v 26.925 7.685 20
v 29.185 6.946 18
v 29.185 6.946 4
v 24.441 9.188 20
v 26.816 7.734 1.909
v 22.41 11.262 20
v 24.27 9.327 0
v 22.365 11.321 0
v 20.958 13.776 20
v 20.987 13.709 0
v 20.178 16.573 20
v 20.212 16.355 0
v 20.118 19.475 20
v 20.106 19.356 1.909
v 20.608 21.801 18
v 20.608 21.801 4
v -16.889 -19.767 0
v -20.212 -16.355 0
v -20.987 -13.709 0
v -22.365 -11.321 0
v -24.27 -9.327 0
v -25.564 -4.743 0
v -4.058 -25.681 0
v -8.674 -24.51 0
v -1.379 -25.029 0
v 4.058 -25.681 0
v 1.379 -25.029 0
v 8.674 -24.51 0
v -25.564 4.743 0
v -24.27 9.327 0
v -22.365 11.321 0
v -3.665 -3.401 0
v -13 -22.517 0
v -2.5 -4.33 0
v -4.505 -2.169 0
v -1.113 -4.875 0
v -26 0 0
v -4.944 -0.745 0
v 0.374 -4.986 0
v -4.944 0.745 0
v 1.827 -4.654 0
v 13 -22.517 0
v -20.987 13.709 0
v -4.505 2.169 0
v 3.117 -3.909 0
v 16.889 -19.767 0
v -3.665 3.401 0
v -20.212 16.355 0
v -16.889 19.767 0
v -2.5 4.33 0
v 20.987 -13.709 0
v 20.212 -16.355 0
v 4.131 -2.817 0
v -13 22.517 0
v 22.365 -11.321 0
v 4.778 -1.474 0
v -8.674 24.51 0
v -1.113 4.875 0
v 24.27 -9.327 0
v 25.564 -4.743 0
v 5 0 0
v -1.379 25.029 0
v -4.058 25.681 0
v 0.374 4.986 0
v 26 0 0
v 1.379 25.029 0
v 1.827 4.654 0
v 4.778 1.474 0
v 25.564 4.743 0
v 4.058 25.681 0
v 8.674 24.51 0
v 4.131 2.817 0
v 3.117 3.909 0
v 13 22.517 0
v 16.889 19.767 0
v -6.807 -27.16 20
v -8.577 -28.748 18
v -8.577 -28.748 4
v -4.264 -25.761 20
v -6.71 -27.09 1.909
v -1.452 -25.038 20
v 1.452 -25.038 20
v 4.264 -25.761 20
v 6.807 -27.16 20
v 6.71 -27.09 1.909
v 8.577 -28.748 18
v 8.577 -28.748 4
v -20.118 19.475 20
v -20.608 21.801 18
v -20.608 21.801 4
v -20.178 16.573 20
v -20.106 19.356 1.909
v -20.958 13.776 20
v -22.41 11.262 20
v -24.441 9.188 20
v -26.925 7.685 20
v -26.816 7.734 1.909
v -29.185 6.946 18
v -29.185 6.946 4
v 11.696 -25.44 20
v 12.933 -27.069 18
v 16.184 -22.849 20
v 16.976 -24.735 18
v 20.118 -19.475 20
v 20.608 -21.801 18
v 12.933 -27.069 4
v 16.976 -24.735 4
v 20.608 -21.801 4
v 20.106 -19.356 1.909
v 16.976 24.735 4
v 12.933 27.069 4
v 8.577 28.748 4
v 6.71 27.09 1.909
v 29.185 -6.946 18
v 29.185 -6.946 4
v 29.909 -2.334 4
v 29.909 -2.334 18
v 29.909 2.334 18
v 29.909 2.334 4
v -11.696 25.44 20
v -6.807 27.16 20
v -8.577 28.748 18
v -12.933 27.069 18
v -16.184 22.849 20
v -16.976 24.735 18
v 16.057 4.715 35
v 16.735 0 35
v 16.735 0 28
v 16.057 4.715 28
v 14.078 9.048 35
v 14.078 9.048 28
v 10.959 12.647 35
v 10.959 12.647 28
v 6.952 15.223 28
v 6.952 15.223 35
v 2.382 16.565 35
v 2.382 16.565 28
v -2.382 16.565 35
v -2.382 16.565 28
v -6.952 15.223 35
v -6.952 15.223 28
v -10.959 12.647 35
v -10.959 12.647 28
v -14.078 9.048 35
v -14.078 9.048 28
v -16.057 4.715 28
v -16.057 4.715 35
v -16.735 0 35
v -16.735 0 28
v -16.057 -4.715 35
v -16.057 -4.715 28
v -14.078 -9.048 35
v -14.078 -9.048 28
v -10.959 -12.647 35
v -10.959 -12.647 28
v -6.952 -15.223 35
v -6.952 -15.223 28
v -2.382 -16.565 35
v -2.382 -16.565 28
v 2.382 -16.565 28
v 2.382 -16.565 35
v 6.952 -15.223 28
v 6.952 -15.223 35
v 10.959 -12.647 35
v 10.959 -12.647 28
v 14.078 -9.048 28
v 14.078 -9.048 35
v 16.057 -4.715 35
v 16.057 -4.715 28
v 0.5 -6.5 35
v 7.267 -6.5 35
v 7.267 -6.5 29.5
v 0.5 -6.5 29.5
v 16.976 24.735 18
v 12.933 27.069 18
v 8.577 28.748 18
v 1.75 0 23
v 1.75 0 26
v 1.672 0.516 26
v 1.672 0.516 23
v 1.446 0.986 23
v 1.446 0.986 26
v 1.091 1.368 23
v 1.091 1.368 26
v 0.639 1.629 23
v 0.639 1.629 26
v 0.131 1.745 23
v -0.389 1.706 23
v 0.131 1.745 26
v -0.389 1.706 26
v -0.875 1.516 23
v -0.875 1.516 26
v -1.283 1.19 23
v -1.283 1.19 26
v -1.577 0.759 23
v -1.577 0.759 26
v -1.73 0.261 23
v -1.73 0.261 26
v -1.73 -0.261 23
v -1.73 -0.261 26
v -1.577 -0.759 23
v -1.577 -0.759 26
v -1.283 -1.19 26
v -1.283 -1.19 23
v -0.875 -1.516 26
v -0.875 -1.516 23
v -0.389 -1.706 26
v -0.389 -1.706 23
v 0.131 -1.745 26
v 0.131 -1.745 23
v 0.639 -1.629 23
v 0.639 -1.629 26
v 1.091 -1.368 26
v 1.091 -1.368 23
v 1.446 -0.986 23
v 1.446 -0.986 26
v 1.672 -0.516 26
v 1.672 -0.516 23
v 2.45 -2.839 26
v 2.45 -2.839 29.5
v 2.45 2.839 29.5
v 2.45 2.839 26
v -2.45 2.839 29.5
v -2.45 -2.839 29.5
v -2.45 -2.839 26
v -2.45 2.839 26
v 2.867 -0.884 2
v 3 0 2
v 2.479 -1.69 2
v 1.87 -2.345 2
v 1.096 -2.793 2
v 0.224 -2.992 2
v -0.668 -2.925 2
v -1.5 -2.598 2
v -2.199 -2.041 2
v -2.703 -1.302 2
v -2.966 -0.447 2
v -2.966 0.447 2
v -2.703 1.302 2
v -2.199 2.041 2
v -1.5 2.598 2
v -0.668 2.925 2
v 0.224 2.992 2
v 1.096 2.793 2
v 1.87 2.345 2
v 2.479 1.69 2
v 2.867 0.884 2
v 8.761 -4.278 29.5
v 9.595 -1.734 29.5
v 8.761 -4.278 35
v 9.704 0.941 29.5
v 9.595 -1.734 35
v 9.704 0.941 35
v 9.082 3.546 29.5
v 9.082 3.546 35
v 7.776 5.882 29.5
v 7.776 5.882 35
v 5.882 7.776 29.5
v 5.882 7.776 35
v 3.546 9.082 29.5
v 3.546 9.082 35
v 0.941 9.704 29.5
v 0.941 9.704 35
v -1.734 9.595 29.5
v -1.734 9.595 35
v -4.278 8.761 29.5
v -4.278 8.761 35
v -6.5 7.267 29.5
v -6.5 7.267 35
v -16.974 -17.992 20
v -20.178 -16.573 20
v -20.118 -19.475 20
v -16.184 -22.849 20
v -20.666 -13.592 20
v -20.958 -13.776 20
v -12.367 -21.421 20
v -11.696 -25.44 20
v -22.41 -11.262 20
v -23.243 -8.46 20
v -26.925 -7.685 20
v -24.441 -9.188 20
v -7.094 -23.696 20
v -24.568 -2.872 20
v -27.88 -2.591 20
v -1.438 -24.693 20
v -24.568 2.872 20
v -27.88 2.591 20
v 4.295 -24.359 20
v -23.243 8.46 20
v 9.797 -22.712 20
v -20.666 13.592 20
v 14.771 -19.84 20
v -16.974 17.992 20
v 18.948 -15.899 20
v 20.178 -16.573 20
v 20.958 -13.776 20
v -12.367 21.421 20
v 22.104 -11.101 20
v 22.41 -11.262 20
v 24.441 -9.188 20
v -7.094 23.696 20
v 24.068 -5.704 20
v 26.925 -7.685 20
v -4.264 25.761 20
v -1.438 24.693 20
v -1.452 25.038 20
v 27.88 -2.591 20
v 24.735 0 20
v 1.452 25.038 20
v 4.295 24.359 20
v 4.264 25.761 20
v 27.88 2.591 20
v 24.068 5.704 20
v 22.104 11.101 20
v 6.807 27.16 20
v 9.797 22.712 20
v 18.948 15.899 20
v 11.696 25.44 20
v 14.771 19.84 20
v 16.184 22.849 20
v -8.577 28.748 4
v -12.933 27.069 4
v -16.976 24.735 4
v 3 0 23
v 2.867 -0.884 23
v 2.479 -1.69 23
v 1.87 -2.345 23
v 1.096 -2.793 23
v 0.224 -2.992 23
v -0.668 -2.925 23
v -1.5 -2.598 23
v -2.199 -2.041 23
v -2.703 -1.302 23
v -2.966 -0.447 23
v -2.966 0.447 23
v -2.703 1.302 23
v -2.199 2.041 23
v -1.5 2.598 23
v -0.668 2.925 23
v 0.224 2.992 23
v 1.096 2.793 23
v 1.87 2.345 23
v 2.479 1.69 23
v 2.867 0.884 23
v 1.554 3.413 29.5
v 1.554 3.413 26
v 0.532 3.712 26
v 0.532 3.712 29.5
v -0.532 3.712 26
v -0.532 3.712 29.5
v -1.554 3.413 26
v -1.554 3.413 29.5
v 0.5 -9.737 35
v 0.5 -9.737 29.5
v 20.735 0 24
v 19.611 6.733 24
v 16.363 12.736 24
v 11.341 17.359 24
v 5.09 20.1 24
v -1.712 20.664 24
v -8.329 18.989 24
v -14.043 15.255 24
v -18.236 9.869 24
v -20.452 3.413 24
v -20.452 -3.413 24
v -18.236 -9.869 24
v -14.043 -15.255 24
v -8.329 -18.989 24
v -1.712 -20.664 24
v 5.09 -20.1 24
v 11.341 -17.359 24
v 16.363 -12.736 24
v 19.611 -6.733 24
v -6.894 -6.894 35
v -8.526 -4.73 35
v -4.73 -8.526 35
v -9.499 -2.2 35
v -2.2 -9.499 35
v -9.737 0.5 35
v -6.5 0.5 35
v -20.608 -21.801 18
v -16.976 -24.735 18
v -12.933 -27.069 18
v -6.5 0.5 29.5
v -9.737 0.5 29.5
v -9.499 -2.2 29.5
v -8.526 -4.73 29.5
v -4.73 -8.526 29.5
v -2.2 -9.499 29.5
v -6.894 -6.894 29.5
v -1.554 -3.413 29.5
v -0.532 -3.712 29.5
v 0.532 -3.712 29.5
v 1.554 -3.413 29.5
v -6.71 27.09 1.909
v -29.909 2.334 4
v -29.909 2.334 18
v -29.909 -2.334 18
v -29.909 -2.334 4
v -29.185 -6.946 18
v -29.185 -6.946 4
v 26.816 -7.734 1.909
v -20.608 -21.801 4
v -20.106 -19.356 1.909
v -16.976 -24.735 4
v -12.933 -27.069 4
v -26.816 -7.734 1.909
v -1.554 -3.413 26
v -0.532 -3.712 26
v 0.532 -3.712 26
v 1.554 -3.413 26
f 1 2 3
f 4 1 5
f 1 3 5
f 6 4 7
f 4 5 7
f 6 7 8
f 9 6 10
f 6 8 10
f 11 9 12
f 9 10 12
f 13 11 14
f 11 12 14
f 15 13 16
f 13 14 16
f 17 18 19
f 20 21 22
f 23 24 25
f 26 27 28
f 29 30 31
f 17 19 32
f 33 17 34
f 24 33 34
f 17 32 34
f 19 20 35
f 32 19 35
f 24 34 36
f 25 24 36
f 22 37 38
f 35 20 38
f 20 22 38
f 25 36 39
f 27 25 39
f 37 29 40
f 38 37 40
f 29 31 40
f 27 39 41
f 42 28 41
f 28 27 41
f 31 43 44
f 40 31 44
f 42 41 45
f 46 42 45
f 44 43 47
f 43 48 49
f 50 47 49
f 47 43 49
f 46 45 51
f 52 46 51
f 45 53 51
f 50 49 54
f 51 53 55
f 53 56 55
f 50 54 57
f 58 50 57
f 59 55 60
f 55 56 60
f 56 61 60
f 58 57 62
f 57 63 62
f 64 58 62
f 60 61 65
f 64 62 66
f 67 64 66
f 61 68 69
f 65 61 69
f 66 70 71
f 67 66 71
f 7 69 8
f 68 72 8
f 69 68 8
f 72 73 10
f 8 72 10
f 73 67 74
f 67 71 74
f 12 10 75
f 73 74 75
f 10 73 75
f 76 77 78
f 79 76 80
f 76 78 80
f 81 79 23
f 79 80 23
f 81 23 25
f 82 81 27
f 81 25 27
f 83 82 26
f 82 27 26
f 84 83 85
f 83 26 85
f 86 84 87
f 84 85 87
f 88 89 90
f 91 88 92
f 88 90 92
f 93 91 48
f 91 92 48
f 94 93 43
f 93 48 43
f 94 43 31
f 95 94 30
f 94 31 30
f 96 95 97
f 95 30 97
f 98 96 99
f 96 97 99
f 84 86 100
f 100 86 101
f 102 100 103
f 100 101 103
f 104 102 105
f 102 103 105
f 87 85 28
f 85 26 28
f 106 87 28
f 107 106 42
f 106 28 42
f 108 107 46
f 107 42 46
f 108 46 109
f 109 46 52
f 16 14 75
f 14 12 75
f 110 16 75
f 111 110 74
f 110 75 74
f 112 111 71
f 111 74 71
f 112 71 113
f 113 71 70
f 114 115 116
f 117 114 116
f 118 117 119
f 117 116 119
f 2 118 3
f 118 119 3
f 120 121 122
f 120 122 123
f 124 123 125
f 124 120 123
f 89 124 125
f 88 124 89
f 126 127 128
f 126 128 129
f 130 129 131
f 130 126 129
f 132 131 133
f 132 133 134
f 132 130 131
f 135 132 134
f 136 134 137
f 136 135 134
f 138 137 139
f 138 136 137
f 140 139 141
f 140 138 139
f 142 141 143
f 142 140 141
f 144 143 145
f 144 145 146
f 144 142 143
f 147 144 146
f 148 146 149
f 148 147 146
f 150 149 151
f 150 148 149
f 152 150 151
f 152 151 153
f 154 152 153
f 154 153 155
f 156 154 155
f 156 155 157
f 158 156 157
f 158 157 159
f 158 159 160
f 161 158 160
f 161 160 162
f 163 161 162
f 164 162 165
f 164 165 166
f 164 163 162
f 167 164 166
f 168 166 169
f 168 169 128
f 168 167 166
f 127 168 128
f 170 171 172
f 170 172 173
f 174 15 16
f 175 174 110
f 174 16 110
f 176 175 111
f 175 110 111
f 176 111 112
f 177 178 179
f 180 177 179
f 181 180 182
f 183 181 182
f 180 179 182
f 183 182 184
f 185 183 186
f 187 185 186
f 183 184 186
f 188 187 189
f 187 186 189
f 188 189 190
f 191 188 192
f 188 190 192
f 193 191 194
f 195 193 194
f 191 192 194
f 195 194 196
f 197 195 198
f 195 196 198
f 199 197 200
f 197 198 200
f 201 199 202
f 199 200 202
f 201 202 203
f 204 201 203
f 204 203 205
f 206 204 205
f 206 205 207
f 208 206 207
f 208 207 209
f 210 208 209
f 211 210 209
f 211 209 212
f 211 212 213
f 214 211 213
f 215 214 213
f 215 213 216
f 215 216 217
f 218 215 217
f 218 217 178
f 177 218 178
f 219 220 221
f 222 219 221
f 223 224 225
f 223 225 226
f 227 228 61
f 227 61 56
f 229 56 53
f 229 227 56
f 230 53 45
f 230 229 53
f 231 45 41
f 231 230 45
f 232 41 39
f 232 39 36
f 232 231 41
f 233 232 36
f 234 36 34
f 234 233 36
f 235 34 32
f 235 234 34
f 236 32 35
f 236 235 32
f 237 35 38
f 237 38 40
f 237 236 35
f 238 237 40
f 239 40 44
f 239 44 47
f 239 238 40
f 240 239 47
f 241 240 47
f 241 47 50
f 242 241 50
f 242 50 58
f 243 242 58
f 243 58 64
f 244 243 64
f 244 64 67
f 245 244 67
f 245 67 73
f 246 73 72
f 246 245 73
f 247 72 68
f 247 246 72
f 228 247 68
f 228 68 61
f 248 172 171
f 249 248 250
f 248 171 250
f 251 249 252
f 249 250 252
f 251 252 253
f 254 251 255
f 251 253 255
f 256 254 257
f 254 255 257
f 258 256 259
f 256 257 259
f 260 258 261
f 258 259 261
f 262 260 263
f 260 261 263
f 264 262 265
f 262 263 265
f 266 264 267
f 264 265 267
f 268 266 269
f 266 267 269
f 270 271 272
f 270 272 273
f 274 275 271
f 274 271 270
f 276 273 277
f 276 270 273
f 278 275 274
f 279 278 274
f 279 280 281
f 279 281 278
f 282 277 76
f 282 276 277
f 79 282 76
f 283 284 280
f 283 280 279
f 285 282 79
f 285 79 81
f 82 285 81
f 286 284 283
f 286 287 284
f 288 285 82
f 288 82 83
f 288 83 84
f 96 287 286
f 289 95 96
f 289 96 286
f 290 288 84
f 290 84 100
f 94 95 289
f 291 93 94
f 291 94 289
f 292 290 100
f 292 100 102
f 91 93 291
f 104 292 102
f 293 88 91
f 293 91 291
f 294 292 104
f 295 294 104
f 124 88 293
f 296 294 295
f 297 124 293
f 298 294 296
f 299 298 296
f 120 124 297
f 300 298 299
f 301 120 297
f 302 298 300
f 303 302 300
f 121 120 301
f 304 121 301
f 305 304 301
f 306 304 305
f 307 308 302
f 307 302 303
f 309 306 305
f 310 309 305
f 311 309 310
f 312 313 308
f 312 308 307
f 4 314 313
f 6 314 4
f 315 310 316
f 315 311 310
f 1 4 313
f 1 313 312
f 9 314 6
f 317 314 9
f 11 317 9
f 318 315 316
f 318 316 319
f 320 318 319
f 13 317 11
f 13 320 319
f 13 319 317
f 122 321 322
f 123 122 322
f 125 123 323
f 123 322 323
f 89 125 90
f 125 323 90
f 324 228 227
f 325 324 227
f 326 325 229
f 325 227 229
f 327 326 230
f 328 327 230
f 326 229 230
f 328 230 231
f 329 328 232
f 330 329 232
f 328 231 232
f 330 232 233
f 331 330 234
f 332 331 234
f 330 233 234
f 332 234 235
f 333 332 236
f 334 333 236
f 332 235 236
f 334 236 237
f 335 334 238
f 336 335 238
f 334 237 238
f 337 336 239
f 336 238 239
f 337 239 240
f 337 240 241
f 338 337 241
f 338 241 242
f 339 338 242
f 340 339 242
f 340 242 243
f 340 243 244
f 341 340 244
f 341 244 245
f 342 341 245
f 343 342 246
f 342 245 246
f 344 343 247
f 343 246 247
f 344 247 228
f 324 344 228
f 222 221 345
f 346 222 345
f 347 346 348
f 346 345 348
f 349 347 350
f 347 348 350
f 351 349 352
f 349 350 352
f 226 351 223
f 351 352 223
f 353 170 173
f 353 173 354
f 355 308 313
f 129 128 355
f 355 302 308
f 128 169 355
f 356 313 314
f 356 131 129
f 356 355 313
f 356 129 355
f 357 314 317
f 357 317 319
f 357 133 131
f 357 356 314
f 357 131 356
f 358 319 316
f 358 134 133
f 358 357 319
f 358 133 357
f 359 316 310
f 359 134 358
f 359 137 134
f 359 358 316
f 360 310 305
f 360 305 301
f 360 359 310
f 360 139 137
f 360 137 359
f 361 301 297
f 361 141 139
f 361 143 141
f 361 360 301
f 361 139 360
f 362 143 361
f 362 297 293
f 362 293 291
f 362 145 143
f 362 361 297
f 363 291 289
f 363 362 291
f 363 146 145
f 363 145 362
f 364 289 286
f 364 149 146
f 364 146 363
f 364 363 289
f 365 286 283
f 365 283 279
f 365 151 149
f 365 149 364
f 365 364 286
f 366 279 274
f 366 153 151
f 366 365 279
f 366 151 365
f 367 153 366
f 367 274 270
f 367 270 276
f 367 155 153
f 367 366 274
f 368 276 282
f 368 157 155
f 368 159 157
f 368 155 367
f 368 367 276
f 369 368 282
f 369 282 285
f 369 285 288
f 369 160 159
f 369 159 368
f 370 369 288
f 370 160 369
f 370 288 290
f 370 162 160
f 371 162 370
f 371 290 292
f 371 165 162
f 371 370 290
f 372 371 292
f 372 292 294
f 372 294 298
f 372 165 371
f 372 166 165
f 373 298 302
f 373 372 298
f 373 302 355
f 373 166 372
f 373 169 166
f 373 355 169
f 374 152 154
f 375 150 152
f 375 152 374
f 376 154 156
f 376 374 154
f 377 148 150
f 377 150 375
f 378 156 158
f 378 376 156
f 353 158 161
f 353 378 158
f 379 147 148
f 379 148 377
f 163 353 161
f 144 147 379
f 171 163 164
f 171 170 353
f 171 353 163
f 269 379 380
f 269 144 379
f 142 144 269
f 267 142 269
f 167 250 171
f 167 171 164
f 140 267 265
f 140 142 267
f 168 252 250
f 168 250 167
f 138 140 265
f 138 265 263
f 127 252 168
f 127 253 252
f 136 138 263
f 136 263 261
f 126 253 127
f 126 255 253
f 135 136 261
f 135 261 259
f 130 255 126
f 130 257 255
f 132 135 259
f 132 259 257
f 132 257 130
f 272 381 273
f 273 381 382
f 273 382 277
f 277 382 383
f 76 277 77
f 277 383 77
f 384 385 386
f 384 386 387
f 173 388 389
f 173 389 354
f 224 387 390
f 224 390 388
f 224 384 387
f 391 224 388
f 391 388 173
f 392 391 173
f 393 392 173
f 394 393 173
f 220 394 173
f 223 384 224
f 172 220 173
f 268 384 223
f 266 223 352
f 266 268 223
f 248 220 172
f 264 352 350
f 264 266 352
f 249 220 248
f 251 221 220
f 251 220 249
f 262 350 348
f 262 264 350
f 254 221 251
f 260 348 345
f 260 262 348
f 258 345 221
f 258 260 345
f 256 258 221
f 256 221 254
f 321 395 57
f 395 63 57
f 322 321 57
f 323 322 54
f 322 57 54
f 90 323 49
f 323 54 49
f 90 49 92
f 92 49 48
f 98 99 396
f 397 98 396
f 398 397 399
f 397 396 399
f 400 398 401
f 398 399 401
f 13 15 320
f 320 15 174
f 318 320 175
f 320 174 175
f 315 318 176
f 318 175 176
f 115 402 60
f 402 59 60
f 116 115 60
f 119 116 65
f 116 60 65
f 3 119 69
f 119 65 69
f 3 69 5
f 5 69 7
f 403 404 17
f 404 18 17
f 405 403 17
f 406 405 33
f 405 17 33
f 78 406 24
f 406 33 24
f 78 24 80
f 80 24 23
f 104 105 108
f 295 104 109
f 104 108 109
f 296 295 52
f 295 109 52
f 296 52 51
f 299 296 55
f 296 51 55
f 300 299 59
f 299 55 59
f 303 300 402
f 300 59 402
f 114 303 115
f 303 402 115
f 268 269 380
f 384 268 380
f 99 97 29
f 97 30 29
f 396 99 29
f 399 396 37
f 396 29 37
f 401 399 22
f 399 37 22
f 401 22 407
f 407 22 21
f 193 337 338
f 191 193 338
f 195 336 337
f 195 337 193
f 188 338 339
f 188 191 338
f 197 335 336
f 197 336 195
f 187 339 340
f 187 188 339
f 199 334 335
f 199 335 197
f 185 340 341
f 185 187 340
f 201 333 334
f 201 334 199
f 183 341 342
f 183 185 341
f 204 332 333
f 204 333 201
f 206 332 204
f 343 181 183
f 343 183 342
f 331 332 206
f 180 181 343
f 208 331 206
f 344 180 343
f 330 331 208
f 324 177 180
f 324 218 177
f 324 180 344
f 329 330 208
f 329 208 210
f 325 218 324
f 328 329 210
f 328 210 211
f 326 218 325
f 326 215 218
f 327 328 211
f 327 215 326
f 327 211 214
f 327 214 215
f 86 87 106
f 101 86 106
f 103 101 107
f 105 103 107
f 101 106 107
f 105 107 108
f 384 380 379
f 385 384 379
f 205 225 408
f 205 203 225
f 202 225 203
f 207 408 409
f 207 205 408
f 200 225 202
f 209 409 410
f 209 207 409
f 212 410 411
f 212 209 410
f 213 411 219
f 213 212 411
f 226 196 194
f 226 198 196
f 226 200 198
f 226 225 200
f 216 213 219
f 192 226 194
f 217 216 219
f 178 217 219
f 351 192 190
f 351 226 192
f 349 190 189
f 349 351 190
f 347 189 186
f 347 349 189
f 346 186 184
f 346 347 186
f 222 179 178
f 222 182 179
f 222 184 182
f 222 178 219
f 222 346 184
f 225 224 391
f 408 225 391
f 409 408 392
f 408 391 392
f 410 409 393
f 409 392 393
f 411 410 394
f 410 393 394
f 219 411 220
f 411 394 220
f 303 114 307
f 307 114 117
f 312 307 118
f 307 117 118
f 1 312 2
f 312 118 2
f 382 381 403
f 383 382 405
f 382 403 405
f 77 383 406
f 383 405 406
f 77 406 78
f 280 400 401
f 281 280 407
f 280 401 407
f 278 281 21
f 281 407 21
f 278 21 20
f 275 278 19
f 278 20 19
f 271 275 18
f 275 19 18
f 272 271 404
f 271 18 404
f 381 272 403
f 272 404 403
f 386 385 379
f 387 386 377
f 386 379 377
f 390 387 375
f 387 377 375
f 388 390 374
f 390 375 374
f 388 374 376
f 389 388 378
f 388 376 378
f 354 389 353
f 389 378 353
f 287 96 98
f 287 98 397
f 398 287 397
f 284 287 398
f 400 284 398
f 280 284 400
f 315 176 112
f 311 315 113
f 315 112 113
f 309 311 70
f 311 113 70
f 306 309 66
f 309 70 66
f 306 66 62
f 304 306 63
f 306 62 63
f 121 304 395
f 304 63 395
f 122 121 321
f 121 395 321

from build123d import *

# Parameters (mm, degrees)
SKETCH_R           = 30
PAD_DEPTH          = 35
SKETCH001_R        = 9.75
POCKET_DEPTH       = 5.5
POCKET001_DEPTH    = 3.5
SKETCH003_R        = 1.75
POCKET002_DEPTH    = 26.001
PAD001_DEPTH       = 9
SKETCH006_R        = 36.546669
SKETCH006_R_2      = 16.734949
POCKET003_DEPTH    = 15
SKETCH008_R        = 11.576804
POCKET004_DEPTH    = 218.576598
POLARPATTERN_COUNT = 6
CHAMFER_SIZE       = 4
CHAMFER001_SIZE    = 2
SKETCH009_R        = 3
POCKET005_DEPTH    = 23
CHAMFER002_SIZE    = 2
CHAMFER003_SIZE    = 8


with BuildPart() as part:
    # Sketch → Pad (new body)
    with BuildSketch(Plane.XY):
        Circle(SKETCH_R)
    extrude(amount=PAD_DEPTH)

    # Sketch001 (on Face3 of Pad) → Pocket (cut)
    with BuildSketch(Plane.XY.offset(35)):
        Circle(SKETCH001_R)
    extrude(amount=-POCKET_DEPTH, mode=Mode.SUBTRACT)

    # Sketch002 (on Face5 of Pocket) → Pocket001 (cut)
    with BuildSketch(Plane.XY.offset(29.5)):
        with BuildLine():
            Line((2.45, -2.839014), (2.45, 2.839014))
            ThreePointArc((2.45, 2.839014), (0, 3.75), (-2.45, 2.839014))
            Line((-2.45, -2.839014), (-2.45, 2.839014))
            ThreePointArc((-2.45, -2.839014), (0, -3.75), (2.45, -2.839014))
        make_face()
    extrude(amount=-POCKET001_DEPTH, mode=Mode.SUBTRACT)

    # Sketch003 (on Face10 of Pocket001) → Pocket002 (cut, through all)
    with BuildSketch(Plane.XY.offset(26)):
        Circle(SKETCH003_R)
    extrude(amount=-POCKET002_DEPTH, mode=Mode.SUBTRACT)

    # Sketch004 (on Face3 of Pocket002) → Pad001 (join)
    with BuildSketch(Plane.XY.offset(35)):
        Polygon((-6.5, 10.255921), (-6.5, 0.5), (-12.416934, 0.5), align=None)
        Polygon((0.5, -6.5), (0.5, -15.116689), (10.696822, -6.5), align=None)
    extrude(amount=-PAD001_DEPTH)

    # Sketch006 (on Face3 of Pad001) → Pocket003 (cut)
    with BuildSketch(Plane.XY.offset(35)):
        Circle(SKETCH006_R)
        Circle(SKETCH006_R_2, mode=Mode.SUBTRACT)
    extrude(amount=-POCKET003_DEPTH, mode=Mode.SUBTRACT)

    # Sketch008 (on Face2 of Pocket003) → Pocket004 (cut, through all)
    with BuildSketch(Plane(origin=(0, 0, 0), x_dir=(1, 0, 0), z_dir=(0, 0, -1))):
        with Locations((0, 36.523853)):
            Circle(SKETCH008_R)
    pocket004 = extrude(amount=-POCKET004_DEPTH, mode=Mode.SUBTRACT)

    # PolarPattern: Pocket004 ×6 about axis
    polarpattern_axis = Axis((0, 0, 0), (0, 0, -1))
    for i in range(1, POLARPATTERN_COUNT):
        add(pocket004.rotate(polarpattern_axis, i * 360 / POLARPATTERN_COUNT), mode=Mode.SUBTRACT)

    # Chamfer
    chamfer_edges = [part.edges().sort_by_distance(p)[0] for p in [
        (15, -25.980762, 0),
        (-15, -25.980762, 0),
        (-30, 0, 0),
        (-15, 25.980762, 0),
        (15, 25.980762, 0),
        (29.795478, 3.497065, 0),
    ]]
    chamfer(chamfer_edges, length=CHAMFER_SIZE)

    # Chamfer001
    chamfer001_edges = [part.edges().sort_by_distance(p)[0] for p in [
        (29.795478, -3.497065, 20),
        (15, -25.980762, 20),
        (15, 25.980762, 20),
        (-15, 25.980762, 20),
        (-15, -25.980762, 20),
        (-30, 0, 20),
    ]]
    chamfer(chamfer001_edges, length=CHAMFER001_SIZE)

    # Sketch009 (on Face10 of Chamfer001) → Pocket005 (cut)
    with BuildSketch(Plane(origin=(0, 0, 0), x_dir=(1, 0, 0), z_dir=(0, 0, -1))):
        Circle(SKETCH009_R)
    extrude(amount=-POCKET005_DEPTH, mode=Mode.SUBTRACT)

    # Chamfer002
    chamfer002_edges = [part.edges().sort_by_distance(p)[0] for p in [
        (-3, 0, 0),
    ]]
    chamfer(chamfer002_edges, length=CHAMFER002_SIZE)

    # Chamfer003
    chamfer003_edges = [part.edges().sort_by_distance(p)[0] for p in [
        (-16.734949, 0, 20),
    ]]
    chamfer(chamfer003_edges, length=CHAMFER003_SIZE)


solid = part.part
